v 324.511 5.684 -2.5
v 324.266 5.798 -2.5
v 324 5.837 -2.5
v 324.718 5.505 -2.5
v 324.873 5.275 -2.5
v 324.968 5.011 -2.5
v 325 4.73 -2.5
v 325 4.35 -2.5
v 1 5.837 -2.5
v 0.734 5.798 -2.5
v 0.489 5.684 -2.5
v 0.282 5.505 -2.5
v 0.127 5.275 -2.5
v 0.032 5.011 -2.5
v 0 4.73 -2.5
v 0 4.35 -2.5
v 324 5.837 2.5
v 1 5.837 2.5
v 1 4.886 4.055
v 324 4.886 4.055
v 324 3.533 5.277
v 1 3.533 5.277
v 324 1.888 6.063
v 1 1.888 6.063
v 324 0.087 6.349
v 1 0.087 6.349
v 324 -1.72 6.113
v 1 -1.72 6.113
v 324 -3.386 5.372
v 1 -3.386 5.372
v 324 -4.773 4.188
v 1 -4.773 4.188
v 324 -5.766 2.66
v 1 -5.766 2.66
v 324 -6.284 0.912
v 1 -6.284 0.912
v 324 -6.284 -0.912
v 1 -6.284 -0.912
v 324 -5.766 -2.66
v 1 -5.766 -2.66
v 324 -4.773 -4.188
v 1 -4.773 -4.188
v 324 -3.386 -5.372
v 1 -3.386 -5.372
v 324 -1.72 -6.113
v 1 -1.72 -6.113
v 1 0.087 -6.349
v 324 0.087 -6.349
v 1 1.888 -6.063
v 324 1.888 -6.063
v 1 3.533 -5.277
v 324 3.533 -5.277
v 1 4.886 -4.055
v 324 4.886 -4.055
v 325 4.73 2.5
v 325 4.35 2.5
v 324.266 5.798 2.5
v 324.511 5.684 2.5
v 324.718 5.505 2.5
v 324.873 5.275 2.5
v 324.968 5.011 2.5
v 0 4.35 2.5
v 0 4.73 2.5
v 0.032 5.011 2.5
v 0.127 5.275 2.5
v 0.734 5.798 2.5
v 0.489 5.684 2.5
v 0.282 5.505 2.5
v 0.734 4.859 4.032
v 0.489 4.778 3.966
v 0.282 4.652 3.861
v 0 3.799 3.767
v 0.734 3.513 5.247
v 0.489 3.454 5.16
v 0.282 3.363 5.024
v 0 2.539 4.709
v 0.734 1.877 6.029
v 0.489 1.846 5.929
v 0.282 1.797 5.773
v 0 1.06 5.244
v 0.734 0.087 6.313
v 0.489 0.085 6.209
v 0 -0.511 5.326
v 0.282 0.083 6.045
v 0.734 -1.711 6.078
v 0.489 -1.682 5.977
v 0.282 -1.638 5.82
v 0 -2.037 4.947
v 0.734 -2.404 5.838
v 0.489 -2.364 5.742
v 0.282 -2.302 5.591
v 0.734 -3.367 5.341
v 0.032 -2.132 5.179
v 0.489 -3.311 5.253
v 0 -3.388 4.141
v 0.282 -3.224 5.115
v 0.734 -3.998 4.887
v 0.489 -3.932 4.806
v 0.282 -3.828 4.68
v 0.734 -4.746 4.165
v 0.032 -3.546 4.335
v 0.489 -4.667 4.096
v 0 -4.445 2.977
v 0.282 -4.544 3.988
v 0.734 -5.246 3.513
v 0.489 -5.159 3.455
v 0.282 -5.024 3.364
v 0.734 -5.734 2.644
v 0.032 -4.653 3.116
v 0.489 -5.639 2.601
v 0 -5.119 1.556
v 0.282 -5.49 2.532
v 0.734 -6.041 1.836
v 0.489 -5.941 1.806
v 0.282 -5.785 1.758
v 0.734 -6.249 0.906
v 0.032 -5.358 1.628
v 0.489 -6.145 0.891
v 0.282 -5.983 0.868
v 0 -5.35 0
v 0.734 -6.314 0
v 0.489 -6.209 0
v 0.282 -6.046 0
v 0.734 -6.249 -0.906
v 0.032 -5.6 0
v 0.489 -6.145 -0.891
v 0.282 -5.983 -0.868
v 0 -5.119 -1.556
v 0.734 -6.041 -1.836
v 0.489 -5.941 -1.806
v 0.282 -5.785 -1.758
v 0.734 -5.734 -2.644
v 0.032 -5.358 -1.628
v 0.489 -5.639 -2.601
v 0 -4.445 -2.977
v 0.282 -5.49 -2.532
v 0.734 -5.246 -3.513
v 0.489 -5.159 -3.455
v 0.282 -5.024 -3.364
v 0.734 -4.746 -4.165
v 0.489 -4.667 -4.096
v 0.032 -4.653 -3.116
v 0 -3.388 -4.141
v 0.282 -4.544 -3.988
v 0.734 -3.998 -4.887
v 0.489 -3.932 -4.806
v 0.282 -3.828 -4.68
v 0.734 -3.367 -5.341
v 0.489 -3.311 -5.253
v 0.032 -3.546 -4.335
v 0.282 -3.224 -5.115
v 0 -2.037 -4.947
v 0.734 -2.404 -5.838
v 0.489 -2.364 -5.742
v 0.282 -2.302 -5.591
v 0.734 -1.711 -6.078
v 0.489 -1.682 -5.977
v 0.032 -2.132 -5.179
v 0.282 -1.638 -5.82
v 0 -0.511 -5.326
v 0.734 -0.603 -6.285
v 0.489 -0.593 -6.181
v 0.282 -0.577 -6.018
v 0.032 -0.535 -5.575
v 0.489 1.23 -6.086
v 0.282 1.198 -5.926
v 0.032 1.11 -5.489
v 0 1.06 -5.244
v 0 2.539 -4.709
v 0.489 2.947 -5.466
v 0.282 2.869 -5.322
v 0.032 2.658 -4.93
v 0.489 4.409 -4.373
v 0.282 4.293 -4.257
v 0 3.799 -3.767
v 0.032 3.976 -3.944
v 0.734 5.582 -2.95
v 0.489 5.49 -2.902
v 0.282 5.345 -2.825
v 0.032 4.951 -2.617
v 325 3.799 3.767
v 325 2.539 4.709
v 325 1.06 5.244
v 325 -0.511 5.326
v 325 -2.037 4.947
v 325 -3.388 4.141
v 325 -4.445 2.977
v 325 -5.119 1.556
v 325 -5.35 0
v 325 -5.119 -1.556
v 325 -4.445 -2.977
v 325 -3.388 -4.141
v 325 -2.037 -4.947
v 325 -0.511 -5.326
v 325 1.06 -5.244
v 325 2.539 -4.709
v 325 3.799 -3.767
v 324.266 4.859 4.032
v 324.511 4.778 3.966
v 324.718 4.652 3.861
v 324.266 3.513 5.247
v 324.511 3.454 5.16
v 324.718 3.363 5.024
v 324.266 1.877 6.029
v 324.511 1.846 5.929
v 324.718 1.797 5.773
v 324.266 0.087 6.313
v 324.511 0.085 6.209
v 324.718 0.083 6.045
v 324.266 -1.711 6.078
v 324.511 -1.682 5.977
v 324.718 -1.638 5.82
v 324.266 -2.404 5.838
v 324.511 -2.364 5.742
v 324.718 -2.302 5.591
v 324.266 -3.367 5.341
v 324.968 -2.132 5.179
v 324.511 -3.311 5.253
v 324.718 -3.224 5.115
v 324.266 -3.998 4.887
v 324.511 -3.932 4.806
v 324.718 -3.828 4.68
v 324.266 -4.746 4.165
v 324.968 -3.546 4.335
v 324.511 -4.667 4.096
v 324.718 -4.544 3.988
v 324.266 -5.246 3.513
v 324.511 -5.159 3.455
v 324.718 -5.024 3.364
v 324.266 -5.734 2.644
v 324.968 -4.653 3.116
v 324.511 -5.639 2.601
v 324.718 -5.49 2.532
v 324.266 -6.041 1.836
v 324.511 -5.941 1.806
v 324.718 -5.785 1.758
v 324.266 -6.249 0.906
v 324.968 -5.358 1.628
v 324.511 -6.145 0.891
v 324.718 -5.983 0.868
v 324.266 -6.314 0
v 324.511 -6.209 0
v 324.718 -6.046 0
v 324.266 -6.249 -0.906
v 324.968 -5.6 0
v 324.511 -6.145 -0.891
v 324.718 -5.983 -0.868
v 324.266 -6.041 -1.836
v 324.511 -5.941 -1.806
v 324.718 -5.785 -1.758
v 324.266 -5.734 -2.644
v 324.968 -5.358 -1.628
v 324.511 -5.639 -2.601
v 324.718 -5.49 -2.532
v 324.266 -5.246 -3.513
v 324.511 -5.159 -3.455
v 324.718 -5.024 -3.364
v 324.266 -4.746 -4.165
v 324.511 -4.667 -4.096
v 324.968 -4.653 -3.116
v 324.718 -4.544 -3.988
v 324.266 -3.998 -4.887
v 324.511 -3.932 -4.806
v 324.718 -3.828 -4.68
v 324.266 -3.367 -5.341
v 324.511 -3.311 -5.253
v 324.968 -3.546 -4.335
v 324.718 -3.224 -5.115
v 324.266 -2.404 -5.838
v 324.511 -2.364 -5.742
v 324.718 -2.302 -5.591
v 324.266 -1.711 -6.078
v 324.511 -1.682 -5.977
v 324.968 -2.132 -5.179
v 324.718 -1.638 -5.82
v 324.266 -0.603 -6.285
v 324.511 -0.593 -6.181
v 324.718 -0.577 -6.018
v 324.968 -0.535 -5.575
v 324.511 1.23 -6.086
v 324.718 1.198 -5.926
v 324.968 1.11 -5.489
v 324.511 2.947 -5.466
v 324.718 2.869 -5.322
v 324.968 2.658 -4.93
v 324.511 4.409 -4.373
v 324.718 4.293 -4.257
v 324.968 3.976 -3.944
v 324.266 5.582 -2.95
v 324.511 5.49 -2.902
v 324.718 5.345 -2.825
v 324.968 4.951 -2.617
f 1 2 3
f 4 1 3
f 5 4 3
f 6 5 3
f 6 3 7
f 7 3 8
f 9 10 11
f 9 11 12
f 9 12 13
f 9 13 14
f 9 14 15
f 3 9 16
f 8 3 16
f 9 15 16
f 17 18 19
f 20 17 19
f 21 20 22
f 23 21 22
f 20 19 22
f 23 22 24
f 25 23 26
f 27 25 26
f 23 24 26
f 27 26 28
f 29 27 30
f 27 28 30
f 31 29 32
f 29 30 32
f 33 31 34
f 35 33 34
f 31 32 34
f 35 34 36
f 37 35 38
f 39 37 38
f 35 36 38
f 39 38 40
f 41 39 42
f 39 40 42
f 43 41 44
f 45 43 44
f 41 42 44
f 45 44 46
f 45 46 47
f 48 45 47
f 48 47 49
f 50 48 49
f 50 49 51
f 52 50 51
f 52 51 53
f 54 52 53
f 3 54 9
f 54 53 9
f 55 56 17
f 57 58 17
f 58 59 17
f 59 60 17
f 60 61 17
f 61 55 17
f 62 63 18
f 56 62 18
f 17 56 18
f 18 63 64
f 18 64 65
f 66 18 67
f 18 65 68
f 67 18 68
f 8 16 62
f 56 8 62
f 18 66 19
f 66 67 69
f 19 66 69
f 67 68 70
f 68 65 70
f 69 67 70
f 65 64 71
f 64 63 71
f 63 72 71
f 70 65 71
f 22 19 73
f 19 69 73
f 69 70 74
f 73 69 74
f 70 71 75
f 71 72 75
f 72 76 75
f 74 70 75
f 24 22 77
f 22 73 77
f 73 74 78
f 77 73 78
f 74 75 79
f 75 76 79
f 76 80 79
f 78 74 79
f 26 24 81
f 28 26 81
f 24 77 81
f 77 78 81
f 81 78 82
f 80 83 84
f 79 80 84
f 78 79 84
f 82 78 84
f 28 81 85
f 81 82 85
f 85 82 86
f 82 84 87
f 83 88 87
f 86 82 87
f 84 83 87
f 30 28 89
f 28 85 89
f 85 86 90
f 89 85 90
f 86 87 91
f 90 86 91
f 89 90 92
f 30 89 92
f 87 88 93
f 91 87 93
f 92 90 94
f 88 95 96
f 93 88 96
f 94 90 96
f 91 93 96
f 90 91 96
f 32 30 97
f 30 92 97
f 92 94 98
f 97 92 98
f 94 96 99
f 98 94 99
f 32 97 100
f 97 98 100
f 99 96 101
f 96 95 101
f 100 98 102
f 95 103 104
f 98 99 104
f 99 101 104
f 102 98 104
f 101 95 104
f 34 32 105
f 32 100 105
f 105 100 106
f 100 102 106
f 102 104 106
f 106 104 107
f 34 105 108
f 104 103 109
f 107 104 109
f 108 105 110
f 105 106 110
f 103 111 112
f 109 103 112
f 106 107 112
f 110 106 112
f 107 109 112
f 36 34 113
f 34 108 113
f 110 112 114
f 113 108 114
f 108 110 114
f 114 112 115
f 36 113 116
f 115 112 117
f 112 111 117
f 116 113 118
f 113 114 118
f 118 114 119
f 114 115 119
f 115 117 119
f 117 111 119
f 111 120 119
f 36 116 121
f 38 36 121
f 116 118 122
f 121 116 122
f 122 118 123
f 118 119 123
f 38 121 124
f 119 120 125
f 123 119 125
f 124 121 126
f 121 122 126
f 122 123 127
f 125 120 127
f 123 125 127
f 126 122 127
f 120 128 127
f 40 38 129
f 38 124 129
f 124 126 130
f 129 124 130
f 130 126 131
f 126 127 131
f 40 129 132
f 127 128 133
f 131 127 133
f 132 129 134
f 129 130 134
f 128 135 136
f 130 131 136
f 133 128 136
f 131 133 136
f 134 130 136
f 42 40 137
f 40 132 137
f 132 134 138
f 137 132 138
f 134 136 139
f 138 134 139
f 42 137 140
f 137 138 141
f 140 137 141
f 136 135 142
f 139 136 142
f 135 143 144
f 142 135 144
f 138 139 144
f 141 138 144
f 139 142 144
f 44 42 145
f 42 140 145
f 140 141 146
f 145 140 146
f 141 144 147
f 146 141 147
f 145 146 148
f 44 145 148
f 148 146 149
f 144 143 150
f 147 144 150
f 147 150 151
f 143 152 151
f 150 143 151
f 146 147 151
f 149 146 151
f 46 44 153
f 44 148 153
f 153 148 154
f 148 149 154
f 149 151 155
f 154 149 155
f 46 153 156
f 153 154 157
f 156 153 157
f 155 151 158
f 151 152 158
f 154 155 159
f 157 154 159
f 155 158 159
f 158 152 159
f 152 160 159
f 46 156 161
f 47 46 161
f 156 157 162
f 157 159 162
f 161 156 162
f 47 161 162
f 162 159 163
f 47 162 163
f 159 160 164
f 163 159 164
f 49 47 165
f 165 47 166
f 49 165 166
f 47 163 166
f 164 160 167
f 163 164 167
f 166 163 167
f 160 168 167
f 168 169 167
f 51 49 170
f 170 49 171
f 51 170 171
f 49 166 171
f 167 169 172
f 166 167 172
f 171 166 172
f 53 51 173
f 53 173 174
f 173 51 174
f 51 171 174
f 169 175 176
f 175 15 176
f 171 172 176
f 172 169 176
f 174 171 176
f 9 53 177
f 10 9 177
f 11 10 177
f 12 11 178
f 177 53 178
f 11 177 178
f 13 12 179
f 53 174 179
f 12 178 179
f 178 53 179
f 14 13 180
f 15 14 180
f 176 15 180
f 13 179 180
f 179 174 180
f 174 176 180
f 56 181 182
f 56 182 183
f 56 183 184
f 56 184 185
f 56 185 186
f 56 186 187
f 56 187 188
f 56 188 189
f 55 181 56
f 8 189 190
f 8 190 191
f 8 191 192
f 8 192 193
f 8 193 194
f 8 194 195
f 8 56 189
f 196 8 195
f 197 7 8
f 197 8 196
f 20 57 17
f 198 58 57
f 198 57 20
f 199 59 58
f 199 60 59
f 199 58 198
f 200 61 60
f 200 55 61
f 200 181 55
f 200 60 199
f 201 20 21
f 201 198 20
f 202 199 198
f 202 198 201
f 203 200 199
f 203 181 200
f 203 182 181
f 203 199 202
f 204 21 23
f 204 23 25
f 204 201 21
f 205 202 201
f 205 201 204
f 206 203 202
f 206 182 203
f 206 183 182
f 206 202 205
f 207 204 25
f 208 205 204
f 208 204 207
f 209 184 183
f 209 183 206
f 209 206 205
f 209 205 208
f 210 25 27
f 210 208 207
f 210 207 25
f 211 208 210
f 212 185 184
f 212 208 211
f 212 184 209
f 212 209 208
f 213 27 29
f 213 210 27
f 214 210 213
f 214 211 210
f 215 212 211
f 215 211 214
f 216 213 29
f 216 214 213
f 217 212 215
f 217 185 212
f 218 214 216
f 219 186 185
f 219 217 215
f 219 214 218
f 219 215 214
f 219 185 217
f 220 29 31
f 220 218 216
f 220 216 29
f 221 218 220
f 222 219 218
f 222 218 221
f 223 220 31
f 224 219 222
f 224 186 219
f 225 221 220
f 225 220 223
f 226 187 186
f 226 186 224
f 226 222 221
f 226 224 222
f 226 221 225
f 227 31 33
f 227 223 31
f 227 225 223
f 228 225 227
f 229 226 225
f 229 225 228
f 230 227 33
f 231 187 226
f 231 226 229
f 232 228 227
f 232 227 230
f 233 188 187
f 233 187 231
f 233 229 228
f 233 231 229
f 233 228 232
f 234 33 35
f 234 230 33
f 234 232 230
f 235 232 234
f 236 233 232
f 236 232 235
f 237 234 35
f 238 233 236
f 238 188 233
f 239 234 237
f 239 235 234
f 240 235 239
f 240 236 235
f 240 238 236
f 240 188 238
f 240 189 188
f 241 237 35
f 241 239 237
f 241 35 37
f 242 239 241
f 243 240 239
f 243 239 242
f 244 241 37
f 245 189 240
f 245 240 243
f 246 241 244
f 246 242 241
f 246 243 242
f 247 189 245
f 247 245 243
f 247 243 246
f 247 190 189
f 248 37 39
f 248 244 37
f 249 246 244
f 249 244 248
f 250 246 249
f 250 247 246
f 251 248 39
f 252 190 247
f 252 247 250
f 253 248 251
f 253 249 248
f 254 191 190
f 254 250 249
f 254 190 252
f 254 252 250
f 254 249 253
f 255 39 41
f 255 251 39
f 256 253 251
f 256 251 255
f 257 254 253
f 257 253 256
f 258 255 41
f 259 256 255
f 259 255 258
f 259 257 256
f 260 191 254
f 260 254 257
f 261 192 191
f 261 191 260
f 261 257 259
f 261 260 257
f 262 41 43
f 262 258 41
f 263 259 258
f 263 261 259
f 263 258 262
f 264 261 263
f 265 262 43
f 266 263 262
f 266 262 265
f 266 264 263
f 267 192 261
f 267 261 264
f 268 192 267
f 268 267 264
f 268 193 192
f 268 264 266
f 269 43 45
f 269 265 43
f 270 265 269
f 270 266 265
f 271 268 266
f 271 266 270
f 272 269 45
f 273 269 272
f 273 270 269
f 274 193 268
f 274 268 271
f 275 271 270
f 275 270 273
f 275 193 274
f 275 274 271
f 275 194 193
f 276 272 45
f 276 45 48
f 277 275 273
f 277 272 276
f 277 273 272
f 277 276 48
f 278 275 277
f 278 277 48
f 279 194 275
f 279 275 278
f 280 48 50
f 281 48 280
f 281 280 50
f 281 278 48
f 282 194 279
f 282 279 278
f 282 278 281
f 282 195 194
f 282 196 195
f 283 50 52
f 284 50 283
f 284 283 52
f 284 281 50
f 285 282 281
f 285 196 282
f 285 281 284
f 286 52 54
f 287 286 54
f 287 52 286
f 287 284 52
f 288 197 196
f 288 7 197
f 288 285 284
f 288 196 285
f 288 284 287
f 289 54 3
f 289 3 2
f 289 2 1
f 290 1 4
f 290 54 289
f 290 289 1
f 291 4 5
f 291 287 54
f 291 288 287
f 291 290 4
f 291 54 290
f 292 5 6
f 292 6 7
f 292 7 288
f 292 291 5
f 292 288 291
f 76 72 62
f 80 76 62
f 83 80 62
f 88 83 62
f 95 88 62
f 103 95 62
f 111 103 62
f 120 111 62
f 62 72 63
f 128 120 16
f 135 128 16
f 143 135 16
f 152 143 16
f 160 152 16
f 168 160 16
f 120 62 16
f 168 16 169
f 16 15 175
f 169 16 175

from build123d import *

# Parameters (mm, degrees)
BOSS_EXTRUDE1_DEPTH = 325
FILLET1_R           = 1


with BuildPart() as part:
    # Sketch2 → Boss-Extrude1 (new body)
    with BuildSketch(Plane(origin=(0, 0, 0), x_dir=(0, 0, -1), z_dir=(1, 0, 0))):
        with BuildLine():
            Line((2.5, 5.837165408), (2.5, 4.35))
            Line((2.5, 4.35), (-2.5, 4.35))
            Line((-2.5, 4.35), (-2.5, 5.837165408))
            ThreePointArc((-2.5, 5.837165408), (0, -6.35), (2.5, 5.837165408))
        make_face()
    extrude(amount=BOSS_EXTRUDE1_DEPTH)

    # Fillet1
    fillet1_edges = [part.edges().sort_by_distance(p)[0] for p in [
        (0, -6.35, 0),
        (325, -6.35, 0),
    ]]
    fillet(fillet1_edges, radius=FILLET1_R)


solid = part.part
